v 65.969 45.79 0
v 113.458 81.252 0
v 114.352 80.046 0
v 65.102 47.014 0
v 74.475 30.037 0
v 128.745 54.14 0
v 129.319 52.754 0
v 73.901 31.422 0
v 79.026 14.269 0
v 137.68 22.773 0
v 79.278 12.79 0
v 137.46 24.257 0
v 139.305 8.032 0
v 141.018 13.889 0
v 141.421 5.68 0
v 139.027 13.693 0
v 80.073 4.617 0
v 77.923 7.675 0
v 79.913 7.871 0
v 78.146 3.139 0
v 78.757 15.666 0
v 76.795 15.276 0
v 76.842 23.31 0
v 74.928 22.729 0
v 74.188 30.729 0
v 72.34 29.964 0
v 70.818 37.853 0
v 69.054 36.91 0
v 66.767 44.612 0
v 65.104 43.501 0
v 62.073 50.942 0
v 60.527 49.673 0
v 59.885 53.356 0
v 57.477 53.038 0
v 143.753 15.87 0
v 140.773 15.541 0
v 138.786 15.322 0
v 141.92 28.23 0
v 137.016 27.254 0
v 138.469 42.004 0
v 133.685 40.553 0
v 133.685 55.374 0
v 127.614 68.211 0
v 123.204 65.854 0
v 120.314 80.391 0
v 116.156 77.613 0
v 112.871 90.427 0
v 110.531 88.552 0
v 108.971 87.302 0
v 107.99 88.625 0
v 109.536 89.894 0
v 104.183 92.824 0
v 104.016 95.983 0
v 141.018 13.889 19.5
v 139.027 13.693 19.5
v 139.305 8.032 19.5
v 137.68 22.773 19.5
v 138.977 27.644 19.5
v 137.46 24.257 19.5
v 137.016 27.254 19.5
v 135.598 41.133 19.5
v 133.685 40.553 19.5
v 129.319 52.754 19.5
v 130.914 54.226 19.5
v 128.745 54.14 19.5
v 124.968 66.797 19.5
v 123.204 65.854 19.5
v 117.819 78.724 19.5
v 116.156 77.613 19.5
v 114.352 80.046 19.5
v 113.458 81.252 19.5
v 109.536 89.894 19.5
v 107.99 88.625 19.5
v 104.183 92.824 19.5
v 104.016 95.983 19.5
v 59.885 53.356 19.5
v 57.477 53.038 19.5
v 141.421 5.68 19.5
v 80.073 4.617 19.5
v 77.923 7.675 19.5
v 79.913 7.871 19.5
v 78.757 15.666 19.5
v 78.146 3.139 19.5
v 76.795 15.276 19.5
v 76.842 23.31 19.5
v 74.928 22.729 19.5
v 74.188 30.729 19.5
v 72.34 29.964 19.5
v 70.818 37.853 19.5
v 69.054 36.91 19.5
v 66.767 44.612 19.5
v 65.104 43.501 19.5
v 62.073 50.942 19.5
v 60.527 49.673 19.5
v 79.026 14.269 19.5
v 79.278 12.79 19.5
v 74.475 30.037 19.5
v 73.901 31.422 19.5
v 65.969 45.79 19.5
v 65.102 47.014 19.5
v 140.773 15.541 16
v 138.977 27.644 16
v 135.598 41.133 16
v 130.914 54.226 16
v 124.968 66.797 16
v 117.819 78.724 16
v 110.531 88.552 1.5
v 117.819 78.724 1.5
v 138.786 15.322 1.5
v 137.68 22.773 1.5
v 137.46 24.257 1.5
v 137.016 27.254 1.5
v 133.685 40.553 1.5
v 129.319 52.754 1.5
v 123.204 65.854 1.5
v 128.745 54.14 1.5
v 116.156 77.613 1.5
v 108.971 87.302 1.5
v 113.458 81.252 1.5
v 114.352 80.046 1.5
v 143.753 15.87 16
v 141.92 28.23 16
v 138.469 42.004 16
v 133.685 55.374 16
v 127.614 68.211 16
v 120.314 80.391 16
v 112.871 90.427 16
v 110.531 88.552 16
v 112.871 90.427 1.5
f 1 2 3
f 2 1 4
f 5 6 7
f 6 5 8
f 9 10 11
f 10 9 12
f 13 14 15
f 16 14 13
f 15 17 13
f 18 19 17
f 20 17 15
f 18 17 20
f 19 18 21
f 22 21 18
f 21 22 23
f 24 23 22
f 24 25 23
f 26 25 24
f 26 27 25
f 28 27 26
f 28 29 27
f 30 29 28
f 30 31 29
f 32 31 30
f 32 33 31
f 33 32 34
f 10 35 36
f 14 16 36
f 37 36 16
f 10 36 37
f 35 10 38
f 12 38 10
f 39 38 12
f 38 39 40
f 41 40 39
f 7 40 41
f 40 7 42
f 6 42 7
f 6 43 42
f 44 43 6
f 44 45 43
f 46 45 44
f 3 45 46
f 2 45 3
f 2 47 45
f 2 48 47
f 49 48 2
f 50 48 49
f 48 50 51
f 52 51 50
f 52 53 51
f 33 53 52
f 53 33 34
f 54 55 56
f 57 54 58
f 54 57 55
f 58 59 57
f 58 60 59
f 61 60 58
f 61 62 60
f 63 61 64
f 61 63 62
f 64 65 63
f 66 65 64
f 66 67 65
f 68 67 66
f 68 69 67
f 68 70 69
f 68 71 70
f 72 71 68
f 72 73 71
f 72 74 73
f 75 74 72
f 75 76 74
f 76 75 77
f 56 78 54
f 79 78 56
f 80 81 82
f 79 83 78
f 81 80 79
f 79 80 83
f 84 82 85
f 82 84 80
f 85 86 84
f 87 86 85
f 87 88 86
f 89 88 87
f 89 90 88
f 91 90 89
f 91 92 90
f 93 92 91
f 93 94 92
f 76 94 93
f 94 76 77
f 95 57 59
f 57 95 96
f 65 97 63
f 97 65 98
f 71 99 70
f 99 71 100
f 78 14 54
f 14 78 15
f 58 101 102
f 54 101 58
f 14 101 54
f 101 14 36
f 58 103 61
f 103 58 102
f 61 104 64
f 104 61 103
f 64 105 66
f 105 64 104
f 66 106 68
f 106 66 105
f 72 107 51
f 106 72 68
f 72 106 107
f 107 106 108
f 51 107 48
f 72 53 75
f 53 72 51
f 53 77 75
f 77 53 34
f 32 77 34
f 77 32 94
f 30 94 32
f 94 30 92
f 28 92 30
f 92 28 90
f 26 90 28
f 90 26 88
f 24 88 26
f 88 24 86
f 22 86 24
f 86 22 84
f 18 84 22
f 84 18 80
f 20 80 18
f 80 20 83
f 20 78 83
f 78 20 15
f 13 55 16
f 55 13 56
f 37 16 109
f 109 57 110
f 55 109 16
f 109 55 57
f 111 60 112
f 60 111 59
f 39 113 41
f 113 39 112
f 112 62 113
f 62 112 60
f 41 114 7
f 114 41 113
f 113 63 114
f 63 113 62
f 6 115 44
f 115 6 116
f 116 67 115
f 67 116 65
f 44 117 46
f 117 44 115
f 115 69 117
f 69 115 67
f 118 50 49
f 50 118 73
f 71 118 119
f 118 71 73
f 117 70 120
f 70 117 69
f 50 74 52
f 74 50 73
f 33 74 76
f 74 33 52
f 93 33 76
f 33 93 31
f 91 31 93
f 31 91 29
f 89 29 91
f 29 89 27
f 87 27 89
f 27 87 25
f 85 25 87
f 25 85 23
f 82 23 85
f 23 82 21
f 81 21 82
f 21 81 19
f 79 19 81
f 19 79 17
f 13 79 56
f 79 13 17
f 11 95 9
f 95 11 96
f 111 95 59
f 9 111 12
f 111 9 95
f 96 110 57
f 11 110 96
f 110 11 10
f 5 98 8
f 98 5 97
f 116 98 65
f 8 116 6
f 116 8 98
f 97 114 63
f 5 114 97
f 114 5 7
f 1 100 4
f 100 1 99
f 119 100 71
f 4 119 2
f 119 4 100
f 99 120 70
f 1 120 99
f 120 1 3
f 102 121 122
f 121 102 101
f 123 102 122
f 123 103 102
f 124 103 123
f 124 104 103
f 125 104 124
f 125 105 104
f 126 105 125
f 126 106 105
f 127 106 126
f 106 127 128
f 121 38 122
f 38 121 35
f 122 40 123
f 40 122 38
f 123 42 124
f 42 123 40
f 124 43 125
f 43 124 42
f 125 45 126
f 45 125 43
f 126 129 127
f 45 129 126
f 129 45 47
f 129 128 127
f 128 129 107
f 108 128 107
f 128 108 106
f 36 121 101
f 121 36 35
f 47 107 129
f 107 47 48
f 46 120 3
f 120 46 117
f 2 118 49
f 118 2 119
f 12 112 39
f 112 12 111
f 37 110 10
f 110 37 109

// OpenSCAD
// ═══════════════════════════════════════════════════════════════════════
//  CowPad — Ejector Magazine  ·  V2 Ballistic Return System
//  ENGN676  ·  Lincoln University  ·  2026
//
//  Gravity-fed cartridge stack. Holds 3 replacement cartridges.
//  Sector-shaped cross-section — cartridges self-orient, cannot jam by rotation.
//  Mounts on the OUTER TROUGH WALL beside the tile (NOT on top of tile).
//  Magazine tube hangs DOWNWARD alongside the OR face — flush with tile top.
//  Cow hooves never contact the magazine.
//  In trough installation: magazine recessed into outer wall pocket.
//
//  HOW IT WORKS:
//    Load cartridges from top (open end up).
//    Bottom cartridge rests on platform in tile cavity.
//    When platform ejects it, next cartridge drops under gravity.
//    Service interval: 3 replacements × 15 days = ~45 days between refills.
//    (5-slot version = ~75 days: extend STACK_COUNT to 5)
//
//  ► PRINT 1 COPY
//  ► Orientation : UPRIGHT (tube axis vertical, open ends up and down)
//  ► Layer height : 0.2mm  ·  Infill 15%  ·  No supports
//  ► Material     : PLA
//  ► Est. time    : ~1.5 hr
// ═══════════════════════════════════════════════════════════════════════

$fn = 64;

// ── Match tile/cavity parameters ─────────────────────────────────────
IR = 75;   OR = 145;   ANG = 45;
CAV_WALL = 5;   CAV_ANG = 3;
FILL_H = 8;   BASE_H = 6;
H = BASE_H + FILL_H;

// ── Magazine tube inner dimensions (match cartridge + clearance) ──────
MAG_IR  = IR  + CAV_WALL + 0.3;   // 80.3  (0.3mm clearance each side)
MAG_OR  = OR  - CAV_WALL - 0.3;   // 139.7
MAG_A1  = CAV_ANG + 0.3;          // 3.3°
MAG_A2  = ANG - CAV_ANG - 0.3;    // 41.7°
MAG_WALL = 2;                       // tube wall thickness

// ── Stack capacity ────────────────────────────────────────────────────
CART_H      = 6.0;    // single cartridge height (must match cowpad_cartridge.scad: FILL_H-LID_H-0.5)
STACK_COUNT = 3;      // number of cartridges in magazine
STACK_H     = STACK_COUNT * (CART_H + 0.5);  // total stack height with gaps

// ── Mounting clip (attaches to tile outer rim) ────────────────────────
CLIP_H    = 8;    // clip engagement height
CLIP_WALL = 3;    // clip extra thickness (wraps outside tile OR wall)
CLIP_A1   = MAG_A1 + 3;   // clip spans middle portion of arc (not full arc)
CLIP_A2   = MAG_A2 - 3;

// ── Cartridge guide rails (inside tube, keep cartridges centred) ──────
RAIL_W  = 1.5;
RAIL_H  = STACK_H;
N_RAILS = 3;  // at arc positions: 15°, 22.5°, 30° (avoid radial edges)

// ═══════════════════════════════════════════════════════════════════════
// HELPERS
// ═══════════════════════════════════════════════════════════════════════

module pie_2d(r, a1, a2) {
  steps = max(4, ceil(a2 - a1));
  pts = concat([[0,0]],
    [for(i=[0:steps])
      [r*cos(a1 + i*(a2-a1)/steps),
       r*sin(a1 + i*(a2-a1)/steps)]]);
  polygon(pts);
}

module ring_sector_2d(ri, ro, a1, a2) {
  intersection() {
    difference() { circle(ro); circle(ri); }
    pie_2d(ro+1, a1, a2);
  }
}

module ring_sector(ri, ro, a1, a2, ht) {
  linear_extrude(ht) ring_sector_2d(ri, ro, a1, a2);
}

// ═══════════════════════════════════════════════════════════════════════
// TUBE WALLS
// Hollow sector tube: outer shell minus inner clearance
// ═══════════════════════════════════════════════════════════════════════

module tube_walls() {
  difference() {
    ring_sector(MAG_IR - MAG_WALL,
                MAG_OR + MAG_WALL,
                MAG_A1 - 1,
                MAG_A2 + 1,
                STACK_H);
    // Hollow interior — cartridges pass through here
    ring_sector(MAG_IR, MAG_OR, MAG_A1, MAG_A2, STACK_H + 0.1);
  }
}

// ═══════════════════════════════════════════════════════════════════════
// GUIDE RAILS
// Thin radial fins inside the tube to keep cartridges vertically aligned
// ═══════════════════════════════════════════════════════════════════════

module guide_rails() {
  for(i = [0:N_RAILS-1]) {
    a = MAG_A1 + (i+0.5) * (MAG_A2 - MAG_A1) / N_RAILS;
    rotate([0,0,a])
      translate([MAG_IR, -RAIL_W/2, 0])
        cube([MAG_OR - MAG_IR, RAIL_W, RAIL_H]);
  }
}

// ═══════════════════════════════════════════════════════════════════════
// MOUNTING CLIP
// A C-channel that wraps over the top of the tile's outer rim.
// Friction-fit: press down to attach, lift to remove.
// ═══════════════════════════════════════════════════════════════════════

module mount_clip() {
  // Clip body: sits at bottom of magazine, wraps outside tile OR wall
  difference() {
    // Outer clip shell
    ring_sector(MAG_OR + MAG_WALL,
                MAG_OR + MAG_WALL + CLIP_WALL,
                CLIP_A1, CLIP_A2,
                CLIP_H + FILL_H);

    // Inner relief: clip slides over tile outer wall (5mm thick)
    // Tile outer wall is at OR to OR+5mm (CAV_WALL)
    // Clip wraps from OR+CAV_WALL outward
    // Leave 0.3mm clearance on inside face (handled by MAG_OR offset)
  }

  // Inward lip at bottom to catch under tile top surface
  ring_sector(MAG_OR,
              MAG_OR + MAG_WALL + CLIP_WALL,
              CLIP_A1, CLIP_A2,
              1.5);
}

// ═══════════════════════════════════════════════════════════════════════
// ASSEMBLE
// Magazine tube sits on top of tile cavity opening.
// Bottom of tube aligns with top of tile (Z=0 in this model = tile top).
// ═══════════════════════════════════════════════════════════════════════

union() {
  tube_walls();
  // Guide rails (subtract from hollow interior — already done since rails
  // are placed inside; difference with hollow already excludes rail volume)
  // Actually rails are added separately within the open space:
  intersection() {
    // Clip rails to tube interior volume
    ring_sector(MAG_IR, MAG_OR, MAG_A1, MAG_A2, STACK_H);
    guide_rails();
  }
  mount_clip();
}
